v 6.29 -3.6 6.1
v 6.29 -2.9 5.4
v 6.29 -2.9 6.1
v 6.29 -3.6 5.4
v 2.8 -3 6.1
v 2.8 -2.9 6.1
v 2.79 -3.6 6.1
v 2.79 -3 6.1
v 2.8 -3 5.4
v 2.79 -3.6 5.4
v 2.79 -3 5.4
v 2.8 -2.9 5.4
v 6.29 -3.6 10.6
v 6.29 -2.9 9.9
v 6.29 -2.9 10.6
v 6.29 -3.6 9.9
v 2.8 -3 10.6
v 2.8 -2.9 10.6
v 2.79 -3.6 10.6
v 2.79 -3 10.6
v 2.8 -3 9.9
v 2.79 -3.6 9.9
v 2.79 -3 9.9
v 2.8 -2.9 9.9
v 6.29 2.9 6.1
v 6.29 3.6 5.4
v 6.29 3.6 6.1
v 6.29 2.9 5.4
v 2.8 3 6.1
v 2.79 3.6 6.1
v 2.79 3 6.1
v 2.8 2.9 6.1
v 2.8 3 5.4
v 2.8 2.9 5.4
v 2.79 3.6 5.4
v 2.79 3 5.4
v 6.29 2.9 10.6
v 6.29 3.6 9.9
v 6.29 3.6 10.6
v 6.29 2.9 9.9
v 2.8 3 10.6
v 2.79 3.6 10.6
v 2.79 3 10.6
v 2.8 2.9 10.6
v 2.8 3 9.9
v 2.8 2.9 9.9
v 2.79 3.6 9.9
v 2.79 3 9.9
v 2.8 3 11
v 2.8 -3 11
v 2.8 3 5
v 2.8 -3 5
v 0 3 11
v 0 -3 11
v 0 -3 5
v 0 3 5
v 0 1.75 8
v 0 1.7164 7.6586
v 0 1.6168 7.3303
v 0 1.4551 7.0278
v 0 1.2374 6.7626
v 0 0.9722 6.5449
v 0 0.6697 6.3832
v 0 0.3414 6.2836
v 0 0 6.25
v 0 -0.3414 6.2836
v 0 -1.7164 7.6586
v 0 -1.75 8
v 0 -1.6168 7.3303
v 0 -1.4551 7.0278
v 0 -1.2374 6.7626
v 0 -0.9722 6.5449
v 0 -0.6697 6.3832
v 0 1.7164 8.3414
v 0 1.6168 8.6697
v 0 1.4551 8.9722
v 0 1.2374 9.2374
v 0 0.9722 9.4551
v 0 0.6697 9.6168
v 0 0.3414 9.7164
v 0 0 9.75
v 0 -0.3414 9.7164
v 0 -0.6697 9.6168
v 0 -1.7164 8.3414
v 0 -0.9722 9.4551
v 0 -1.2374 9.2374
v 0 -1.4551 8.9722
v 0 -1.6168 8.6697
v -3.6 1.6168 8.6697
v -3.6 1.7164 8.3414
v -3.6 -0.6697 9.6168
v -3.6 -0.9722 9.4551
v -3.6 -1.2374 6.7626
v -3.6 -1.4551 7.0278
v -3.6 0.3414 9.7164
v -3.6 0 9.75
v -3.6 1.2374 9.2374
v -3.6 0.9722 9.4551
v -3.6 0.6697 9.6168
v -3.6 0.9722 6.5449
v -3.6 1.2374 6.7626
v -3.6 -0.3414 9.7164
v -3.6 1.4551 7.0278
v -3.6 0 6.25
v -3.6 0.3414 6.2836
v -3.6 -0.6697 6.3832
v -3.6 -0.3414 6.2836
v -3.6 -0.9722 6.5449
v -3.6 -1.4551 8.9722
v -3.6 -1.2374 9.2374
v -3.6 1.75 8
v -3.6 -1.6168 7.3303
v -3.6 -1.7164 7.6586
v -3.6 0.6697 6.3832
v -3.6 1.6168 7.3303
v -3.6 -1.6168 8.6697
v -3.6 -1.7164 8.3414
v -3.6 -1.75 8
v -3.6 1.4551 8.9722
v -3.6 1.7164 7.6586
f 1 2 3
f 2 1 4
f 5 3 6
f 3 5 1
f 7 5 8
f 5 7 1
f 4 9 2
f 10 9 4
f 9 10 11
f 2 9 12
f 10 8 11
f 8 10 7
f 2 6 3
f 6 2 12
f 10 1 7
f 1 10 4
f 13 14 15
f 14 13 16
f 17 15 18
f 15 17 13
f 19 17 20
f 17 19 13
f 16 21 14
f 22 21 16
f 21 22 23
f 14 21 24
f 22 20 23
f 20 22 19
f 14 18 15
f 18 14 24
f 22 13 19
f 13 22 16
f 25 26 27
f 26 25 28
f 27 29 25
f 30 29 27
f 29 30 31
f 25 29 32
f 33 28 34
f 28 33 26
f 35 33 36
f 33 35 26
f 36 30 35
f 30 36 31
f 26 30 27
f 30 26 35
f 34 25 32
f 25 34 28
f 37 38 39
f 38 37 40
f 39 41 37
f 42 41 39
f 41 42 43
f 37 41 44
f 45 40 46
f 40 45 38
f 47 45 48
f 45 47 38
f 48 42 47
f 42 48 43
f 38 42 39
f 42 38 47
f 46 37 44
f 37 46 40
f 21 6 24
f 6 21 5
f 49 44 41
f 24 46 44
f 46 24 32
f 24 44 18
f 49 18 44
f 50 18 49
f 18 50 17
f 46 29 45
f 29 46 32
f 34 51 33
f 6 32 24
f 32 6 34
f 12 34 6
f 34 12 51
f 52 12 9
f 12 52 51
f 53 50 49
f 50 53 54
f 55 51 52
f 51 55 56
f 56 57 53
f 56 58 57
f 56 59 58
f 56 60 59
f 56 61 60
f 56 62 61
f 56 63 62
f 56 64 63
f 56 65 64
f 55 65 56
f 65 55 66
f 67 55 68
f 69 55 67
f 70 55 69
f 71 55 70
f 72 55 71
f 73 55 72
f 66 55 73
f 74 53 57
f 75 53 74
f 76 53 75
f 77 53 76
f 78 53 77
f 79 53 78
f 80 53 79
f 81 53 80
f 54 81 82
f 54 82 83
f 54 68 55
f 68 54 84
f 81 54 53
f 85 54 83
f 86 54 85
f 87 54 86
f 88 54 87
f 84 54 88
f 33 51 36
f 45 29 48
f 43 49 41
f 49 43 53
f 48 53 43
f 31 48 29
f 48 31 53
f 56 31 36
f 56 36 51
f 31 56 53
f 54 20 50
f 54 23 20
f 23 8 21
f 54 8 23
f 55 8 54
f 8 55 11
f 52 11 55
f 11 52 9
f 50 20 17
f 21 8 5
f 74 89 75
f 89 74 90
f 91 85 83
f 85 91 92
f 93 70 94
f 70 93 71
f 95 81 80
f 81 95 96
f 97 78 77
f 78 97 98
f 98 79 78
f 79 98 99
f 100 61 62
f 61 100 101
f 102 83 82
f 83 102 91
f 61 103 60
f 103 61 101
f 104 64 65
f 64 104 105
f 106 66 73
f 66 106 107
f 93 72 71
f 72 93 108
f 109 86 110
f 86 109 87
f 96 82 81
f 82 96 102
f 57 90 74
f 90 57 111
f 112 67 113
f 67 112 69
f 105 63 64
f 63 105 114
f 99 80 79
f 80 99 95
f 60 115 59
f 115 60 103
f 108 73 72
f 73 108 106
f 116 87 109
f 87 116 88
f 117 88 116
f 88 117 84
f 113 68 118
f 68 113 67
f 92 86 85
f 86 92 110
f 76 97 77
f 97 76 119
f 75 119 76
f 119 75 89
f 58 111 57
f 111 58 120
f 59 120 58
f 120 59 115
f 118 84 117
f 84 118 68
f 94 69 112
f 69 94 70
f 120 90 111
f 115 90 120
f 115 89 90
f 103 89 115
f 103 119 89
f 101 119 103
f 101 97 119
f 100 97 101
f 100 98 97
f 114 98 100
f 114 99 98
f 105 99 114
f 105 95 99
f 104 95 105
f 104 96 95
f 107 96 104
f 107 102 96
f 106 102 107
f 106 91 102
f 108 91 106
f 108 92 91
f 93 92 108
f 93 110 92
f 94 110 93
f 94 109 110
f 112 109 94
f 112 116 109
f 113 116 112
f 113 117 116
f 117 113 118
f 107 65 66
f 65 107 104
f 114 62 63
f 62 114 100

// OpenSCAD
// file: ../tactile-6x6.scad
//-----------------------------------------------------------------------
// 6 x 6 tactile switch, mounted on its side with the stem through a wall
//
// Push in and click: sit the switch on the seat a few mm back from the wall,
// legs to the sides, and push it forward. The stem goes into a plain round
// hole; the body pushes two flexing cheeks apart and their teeth snap in
// behind it. The teeth then take the press.
//
// Three modules, all in the same frame:
//   tact6x6Ghost()    the switch, for previews
//   tact6x6Holder()   the plastic inside the box: seat, cheeks and teeth
//   tact6x6WallCut()  subtract from the wall: the stem hole
//
// Frame: origin on the floor top at the wall's inner face, under the stem
// axis. +X into the box, Z up. The wall is X = -wall .. 0. Units: mm.
//
// standoff moves the switch back from the wall: use it when a stem is longer
// than you want standing proud (tact6x6Proud() says how far it stands).
// Sizes: the kit's switches by name in tact6Sizes ("lp", "4.3" .. "13");
// tact6x6Standoff(name, wall, proud) gives the standoff for a wanted proud.
//
// Use with `use <.../components/tactile-6x6/tactile-6x6.scad>`; call the
// modules inside translate/rotate to place them.
//-----------------------------------------------------------------------

//-- The switch. Defaults: BOJACK 6 x 6 low-profile, measured 2026-10-30
tact6Body      = 6.0;     // body, square
tact6BodyH     = 2.8;     // body thickness, mounting face to back (measured)
tact6Stem      = 3.6;     // stem length past the body's face (6.4 overall, measured)
tact6StemDia   = 3.5;     // measured
tact6LegPitch  = 6.5;     // legs leave two opposite sides at the back edge, this far apart
tact6LegSpan   = 4.5;     // the two legs on one side, apart
tact6LegLength = 3.5;     // past the body's back
tact6LegW      = 0.7;

//-- The holder
tact6Clearance = 0.3;     // between the body and each cheek
tact6Tooth     = 0.6;     // how far each tooth reaches in behind the body: CAL by the fit piece
tact6ToothRamp = 1.5;     // lead-in length behind the catch
tact6CatchGap  = 0.1;     // body's back to the catch faces: snug, so a press clicks instead of shoving it back
tact6HoleClear = 0.4;     // stem hole over the stem diameter
tact6Cheek     = 1.6;     // cheek thickness
tact6CheekGap  = 0.5;     // between the seat and each cheek, so the cheeks flex from the floor
tact6LegGroove = 1.4;     // grooves in the cheeks for the legs (0.7 legs, with their kinks)
tact6Start     = 1.0;     // stem tip to the wall when the switch is set down, before the push

//-- Sizes: the BOJACK 6 x 6 kit (B07ZN11155), by name. [name, overall, body]
//-- overall: back of the body to the stem tip, the kit listing's height. Only "lp" is
//-- measured; the others assume a 3.5 body: CAL each before relying on it
tact6Sizes = [
  ["lp",   6.4, 2.8],     // the low-profile one, measured 2026-10-30 (the defaults above)
  ["4.3",  4.3, 3.5],
  ["5",    5.0, 3.5],
  ["6",    6.0, 3.5],
  ["7",    7.0, 3.5],
  ["8",    8.0, 3.5],
  ["9",    9.0, 3.5],
  ["10",  10.0, 3.5],
  ["11",  11.0, 3.5],
  ["12",  12.0, 3.5],
  ["13",  13.0, 3.5],
];

function tact6Size(name) = let (i = search([name], tact6Sizes)[0])
  assert(i != [] && i != undef, str("unknown 6x6 size ", name)) tact6Sizes[i];
function tact6BodyHOf(name) = tact6Size(name)[2];
function tact6StemOf(name)  = tact6Size(name)[1] - tact6Size(name)[2];

//-- how far the stem stands proud of the wall's outer face
function tact6x6Proud(wall, standoff = 0, stem = tact6Stem) = stem - wall - standoff;

//-- the standoff that leaves a named switch's stem `proud` past a `wall`. Pass it to the
//-- modules with bodyH = tact6BodyHOf(name), stem = tact6StemOf(name)
function tact6x6Standoff(name, wall, proud) =
  let (s = tact6StemOf(name) - wall - proud)
  assert(s > -0.01, str("the ", name, " switch's stem is too short to stand ", proud, " past a ", wall, " wall"))
  max(s, 0);

//-- axisZ: stem axis above the floor; at least tact6Body/2 + 1
module tact6x6Ghost(axisZ, standoff = 0, bodyH = tact6BodyH, stem = tact6Stem)
{
  translate([standoff, 0, 0])
  {
    %color("DimGray") translate([0, -tact6Body/2, axisZ - tact6Body/2]) cube([bodyH, tact6Body, tact6Body]);
    %color("Black") translate([0, 0, axisZ]) rotate([0, -90, 0]) cylinder(d = tact6StemDia, h = stem, $fn = 24);
    for (s = [-1, 1], z = [-1, 1])
      %color("Silver") translate([bodyH, s*tact6LegPitch/2 - tact6LegW/2, axisZ + z*tact6LegSpan/2 - tact6LegW/2])
        cube([tact6LegLength, tact6LegW, tact6LegW]);
  }
}

module tact6x6Holder(axisZ, standoff = 0, clearance = tact6Clearance, tooth = tact6Tooth,
                     bodyH = tact6BodyH, stem = tact6Stem)
{
  half    = tact6Body/2;
  inner   = half + clearance;                       // cheek inner faces
  seatW   = inner - tact6CheekGap;                  // seat half-width: the cheeks clear it
  seatTop = axisZ - half;                           // the body rests on it, stem on the axis
  catchX  = standoff + bodyH + tact6CatchGap;       // teeth's catch faces, behind the body
  startX  = max(standoff + stem + tact6Start, catchX + tact6ToothRamp);   // body front when set down
  cheekX0 = max(standoff, 0.5);                     // clear of the wall, so the cheeks flex
  cheekX1 = catchX + tact6ToothRamp;
  legOut  = tact6LegPitch/2 + tact6LegW/2 + 0.3;    // groove depth: outside the legs and their kinks
  toothH  = tact6LegSpan - tact6LegGroove - 0.3;    // fits between the leg grooves
  assert(axisZ >= half + 1, "axisZ too low for the seat");

  //-- seat, from the wall back past where the switch is set down
  translate([0, -seatW, 0]) cube([startX + bodyH + 0.5, 2*seatW, seatTop]);
  //-- front stop when the body sits back from the wall
  if (standoff > 0)
    translate([standoff - 1.2, -seatW, 0]) cube([1.2, 2*seatW, seatTop + 1.5]);
  for (m = [0, 1])
    mirror([0, m, 0])
    {
      difference()
      {
        //-- cheek, from the floor to the body's top
        translate([cheekX0, inner, 0]) cube([cheekX1 - cheekX0, tact6Cheek, axisZ + half]);
        //-- grooves the legs slide along, open at the back
        for (z = [-1, 1])
          translate([standoff + bodyH - 0.6, inner - 1, axisZ + z*tact6LegSpan/2 - tact6LegGroove/2])
            cube([cheekX1, 1 + legOut - inner, tact6LegGroove]);
      }
      //-- tooth between the leg grooves: square catch face forward, ramp behind
      translate([0, 0, axisZ - toothH/2])
        linear_extrude(toothH)
          polygon([[catchX, inner + 0.01], [catchX, inner - tooth], [catchX + tact6ToothRamp, inner + 0.01]]);
    }
}

module tact6x6WallCut(axisZ, wall)
{
  translate([-wall - 1, 0, axisZ]) rotate([0, 90, 0])
    cylinder(d = tact6StemDia + tact6HoleClear, h = wall + 2, $fn = 32);
}
// main file
// The switch as a solid, for the catalogue (the Ghost is % so it never renders).
// n switches at the fit piece's pitch.
include <../tactile-6x6.scad>

axisZ = 8;
n     = 1;
pitch = 16;

module tact6x6Solid(axisZ)
{
  translate([0, -tact6Body/2, axisZ - tact6Body/2]) cube([tact6BodyH, tact6Body, tact6Body]);
  translate([0.01, 0, axisZ]) rotate([0, -90, 0]) cylinder(d = tact6StemDia, h = tact6Stem + 0.01, $fn = 32);
  for (s = [-1, 1], z = [-1, 1])
    translate([tact6BodyH - 0.01, s*tact6LegPitch/2 - tact6LegW/2, axisZ + z*tact6LegSpan/2 - tact6LegW/2])
      cube([tact6LegLength, tact6LegW, tact6LegW]);
}

for (i = [0 : n - 1]) translate([0, i*pitch, 0]) tact6x6Solid(axisZ);
